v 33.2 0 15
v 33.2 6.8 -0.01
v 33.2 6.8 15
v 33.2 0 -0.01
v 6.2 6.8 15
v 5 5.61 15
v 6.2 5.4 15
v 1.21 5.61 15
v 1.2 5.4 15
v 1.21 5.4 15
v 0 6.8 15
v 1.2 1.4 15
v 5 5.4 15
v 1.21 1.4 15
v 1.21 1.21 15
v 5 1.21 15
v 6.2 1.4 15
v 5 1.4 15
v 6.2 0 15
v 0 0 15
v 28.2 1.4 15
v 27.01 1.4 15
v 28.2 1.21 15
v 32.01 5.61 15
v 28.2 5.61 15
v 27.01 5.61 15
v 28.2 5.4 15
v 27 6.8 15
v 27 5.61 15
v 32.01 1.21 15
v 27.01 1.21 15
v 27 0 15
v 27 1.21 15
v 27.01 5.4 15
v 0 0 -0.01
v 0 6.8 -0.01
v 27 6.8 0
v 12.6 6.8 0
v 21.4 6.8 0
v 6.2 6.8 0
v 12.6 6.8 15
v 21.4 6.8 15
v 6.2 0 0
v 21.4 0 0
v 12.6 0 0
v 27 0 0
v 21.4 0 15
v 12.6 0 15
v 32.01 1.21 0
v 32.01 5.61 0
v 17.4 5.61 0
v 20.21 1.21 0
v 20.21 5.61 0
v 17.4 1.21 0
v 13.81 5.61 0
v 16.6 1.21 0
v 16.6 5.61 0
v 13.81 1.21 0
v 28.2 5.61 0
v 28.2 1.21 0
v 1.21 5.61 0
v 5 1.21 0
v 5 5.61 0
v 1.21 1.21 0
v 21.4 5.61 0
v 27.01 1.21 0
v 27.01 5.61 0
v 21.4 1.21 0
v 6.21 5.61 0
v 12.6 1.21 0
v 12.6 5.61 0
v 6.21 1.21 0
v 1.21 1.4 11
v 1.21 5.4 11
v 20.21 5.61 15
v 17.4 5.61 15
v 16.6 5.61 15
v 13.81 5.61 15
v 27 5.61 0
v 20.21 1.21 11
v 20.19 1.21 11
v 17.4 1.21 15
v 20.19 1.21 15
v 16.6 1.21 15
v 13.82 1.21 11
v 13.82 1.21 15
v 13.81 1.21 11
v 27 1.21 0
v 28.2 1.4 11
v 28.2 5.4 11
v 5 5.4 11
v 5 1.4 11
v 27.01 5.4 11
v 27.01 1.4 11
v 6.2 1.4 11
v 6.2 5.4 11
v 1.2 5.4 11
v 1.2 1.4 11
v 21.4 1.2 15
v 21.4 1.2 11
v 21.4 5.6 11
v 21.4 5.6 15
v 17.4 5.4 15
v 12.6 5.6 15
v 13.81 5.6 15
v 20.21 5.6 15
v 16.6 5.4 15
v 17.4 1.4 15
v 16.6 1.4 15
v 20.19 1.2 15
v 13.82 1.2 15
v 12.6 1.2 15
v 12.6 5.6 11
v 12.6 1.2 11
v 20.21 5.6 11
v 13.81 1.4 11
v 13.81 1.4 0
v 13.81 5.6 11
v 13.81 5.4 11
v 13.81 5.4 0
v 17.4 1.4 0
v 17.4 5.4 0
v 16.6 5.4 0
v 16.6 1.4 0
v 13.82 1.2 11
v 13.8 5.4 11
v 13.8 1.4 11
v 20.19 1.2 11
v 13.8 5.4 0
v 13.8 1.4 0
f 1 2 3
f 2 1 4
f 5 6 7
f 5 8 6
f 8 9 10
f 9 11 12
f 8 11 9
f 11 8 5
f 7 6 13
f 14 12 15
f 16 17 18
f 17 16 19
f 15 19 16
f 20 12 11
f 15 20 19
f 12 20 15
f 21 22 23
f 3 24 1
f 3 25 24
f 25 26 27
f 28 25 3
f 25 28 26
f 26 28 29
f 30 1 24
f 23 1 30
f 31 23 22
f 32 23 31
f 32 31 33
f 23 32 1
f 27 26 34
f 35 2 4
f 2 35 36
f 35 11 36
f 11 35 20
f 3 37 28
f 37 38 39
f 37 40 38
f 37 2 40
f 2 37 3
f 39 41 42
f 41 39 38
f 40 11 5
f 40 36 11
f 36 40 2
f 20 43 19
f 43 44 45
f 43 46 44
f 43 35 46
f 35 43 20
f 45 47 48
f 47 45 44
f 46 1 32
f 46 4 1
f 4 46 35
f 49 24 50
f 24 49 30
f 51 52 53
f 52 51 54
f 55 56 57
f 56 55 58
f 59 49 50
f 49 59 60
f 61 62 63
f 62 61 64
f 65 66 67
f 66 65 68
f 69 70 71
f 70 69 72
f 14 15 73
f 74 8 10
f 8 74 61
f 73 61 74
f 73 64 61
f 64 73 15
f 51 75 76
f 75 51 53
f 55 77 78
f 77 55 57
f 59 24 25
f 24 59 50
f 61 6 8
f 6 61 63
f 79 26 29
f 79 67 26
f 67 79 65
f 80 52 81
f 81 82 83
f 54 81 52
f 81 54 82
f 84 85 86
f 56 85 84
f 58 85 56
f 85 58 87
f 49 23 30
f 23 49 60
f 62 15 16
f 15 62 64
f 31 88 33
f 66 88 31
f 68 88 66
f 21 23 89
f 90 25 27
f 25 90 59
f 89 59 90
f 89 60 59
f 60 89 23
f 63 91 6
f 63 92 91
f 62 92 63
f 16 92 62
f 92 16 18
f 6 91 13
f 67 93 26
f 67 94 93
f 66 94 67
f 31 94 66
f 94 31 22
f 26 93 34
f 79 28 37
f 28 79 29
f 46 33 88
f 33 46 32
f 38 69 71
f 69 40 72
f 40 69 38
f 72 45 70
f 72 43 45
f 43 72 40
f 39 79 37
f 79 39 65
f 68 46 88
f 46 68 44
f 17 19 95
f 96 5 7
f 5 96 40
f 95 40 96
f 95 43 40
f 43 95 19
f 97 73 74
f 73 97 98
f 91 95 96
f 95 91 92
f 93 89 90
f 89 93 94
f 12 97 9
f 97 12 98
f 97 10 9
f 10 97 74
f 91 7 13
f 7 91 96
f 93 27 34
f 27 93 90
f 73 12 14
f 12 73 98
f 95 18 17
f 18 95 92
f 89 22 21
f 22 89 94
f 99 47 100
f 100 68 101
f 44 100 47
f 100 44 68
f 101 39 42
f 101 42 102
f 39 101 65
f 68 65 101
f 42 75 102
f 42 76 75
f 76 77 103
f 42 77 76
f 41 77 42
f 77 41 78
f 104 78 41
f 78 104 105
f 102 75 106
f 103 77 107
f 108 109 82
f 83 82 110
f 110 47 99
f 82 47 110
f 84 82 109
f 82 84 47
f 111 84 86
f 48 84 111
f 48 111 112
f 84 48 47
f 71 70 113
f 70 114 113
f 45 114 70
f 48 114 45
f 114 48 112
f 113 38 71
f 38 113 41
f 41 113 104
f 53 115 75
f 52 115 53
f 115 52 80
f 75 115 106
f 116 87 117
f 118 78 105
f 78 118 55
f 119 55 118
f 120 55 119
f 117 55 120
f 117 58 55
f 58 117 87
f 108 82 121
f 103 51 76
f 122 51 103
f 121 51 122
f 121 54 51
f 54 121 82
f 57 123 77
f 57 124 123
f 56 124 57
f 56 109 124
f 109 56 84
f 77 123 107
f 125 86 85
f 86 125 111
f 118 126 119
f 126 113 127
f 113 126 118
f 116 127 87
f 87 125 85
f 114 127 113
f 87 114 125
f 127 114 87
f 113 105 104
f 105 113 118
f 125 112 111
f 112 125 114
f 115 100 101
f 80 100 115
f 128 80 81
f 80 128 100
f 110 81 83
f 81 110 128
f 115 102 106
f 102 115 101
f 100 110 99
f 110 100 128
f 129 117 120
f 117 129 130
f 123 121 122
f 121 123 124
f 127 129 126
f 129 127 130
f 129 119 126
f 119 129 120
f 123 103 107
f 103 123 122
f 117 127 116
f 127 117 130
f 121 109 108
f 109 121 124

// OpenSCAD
// file: ../Base/PlacementOptions.scad
// Fischertechnik Box Foundation
// Placement Options

// Alignment
NoAlign = 0;
AlignLeft = 1;
AlignBottom = 2;
AlignCenter = 3;
AlignRight = 4;
AlignTop = 5;

// Element rotation degree steps
rotations = [0, -90, -180, -270];

// Rotation
NoRotation = 0;
Rotate0 = 0;
Rotate90 = 1;
Rotate180 = 2;
Rotate270 = 3;

// Docking (seen from above)
NoDock = -1;
DockLeft = 0;
DockTop = 1;
DockRight = 2;
DockCorner = 2;
DockBottom = 3;

// Web corners
LowerLeft = 0;
UpperLeft = 1;
UpperRight = 2;
LowerRight = 3;

// Web position relative to corner
LeftOfCorner = 0;
RightOfCorner = 1;
// file: ../Base/Boxes.scad
// Fischertechnik Box Foundation
// Pre-designed Boxes

use <Constants.scad>

include <PlacementOptions.scad>

box190Width = 190;
box190Depth = 130;
box130Width = 130;
box130Depth = 95;

// Values are from an original ec3 box
topBottomDifference = 1.5;
outerHeight = 40;
baseThickness = 1.8;
innerHeight = outerHeight - baseThickness;
stackExcess = 5.7;
radius = 3.5;
wallThickness = 1.5;
tolerance = 0.2;

boxWallThickness = wallThickness;
boxBaseThickness = baseThickness;
boxWebWidth = 3.0;

// getBoxWallThickness()
// Gets the wall thickness of a Fischertechnik Box
function getBoxWallThickness() = boxWallThickness;

// getBoxUsageHeight(height = 38.2)
// Gets the usable height of a Fischertechnik box
// height = Outer height of the box from the bottom to the upper edge.
function getBoxUsageHeight(height = outerHeight) = height - baseThickness - stackExcess;

// getBoxInnerHeight()
// Gets the inner height of a Fischertechnik box, including the stack excess
function getBoxInnerHeight() = innerHeight;

// getBoxBaseThickness()
// Gets the thickness of the Fischertechnik box base.
function getBoxBaseThickness() = boxBaseThickness;

// getBoxWebWidth()
// Gets the width of a box web
function getBoxWebWidth() = boxWebWidth;

// getBox190Space()
// Gets the usable inner space of a Box 190 as an x/y-list
function getBox190Space() = [
    box190Width - 2*getBoxWallThickness() - topBottomDifference, 
    box190Depth - 2*getBoxWallThickness() - topBottomDifference ];

// RoundedCornerPlate(width, depth, height, radius)
// Creates a body plate with rounded corners for a box. Used
// also to create the complete box with the hull module.
// width = Width of the plate
// depth = depth of the plate 
// height = thickness of the plate
// radius = radius of the rounded corner
module RoundedCornerPlate(width, depth, height, radius) {
    translate([radius, radius])
    hull() {
        w = width-2*radius;
        d = depth-2*radius;
        cube([w, d, height]);
        cylinder(height, r=radius, $fn=getFragments());
        translate([w, 0])
            cylinder(height, r=radius, $fn=getFragments());
        translate([w, d])
            cylinder(height, r=radius, $fn=getFragments());
        translate([0, d])
            cylinder(height, r=radius, $fn=getFragments());
    }
}

// BoxBase(width, depth)
// Creates an empty stackable Fischertechnik compatible box
// width = Outer width of the box (190, 130, ...)
// depth = Outer depth of the box (130, 95, ...)

module BoxBase(width, depth, height=outerHeight) {    
    thinPlate = 0.01;

    innerHeight = height - baseThickness;    
    
    module Body(tolerance=tolerance) {
        hull() {
            // Bottom with tolerance to fit into the original boxes when stacked
            translate([-wallThickness+tolerance, -wallThickness+tolerance, -baseThickness])
                RoundedCornerPlate(width-topBottomDifference-2*tolerance, depth-topBottomDifference-2*tolerance, thinPlate, radius);
            
            // Top
            translate([-wallThickness-topBottomDifference/2, -wallThickness-topBottomDifference/2, innerHeight-thinPlate])
                RoundedCornerPlate(width, depth, thinPlate, radius);
         }
    }

    module Cutoff() {
        hull() {
            coWidth = width - 2*wallThickness;
            coDepth = depth - 2*wallThickness;
            
            // Bottom
            RoundedCornerPlate(coWidth-topBottomDifference, coDepth-topBottomDifference, thinPlate, radius);

            // Top
            translate([-topBottomDifference/2, -topBottomDifference/2, innerHeight+thinPlate]) 
                RoundedCornerPlate(coWidth, coDepth, thinPlate, radius);
        }
    }
    
    difference() {        
        Body();
        Cutoff();
        stackOffset = innerHeight - stackExcess;
        translate([0, 0, stackOffset + baseThickness])
            Body(tolerance=0);
    }
}

// Creates the Fischertechnik empty box 130x190 mm and places it at position 0,0
// 190x130 are the outer sizes, the inner space is slightly smaller. Use getBox190Space() to get the inner sizes.
// The box is positioned that the usable inner space is at the 0,0,0 position.

module Box190() {
    BoxBase(box190Width, box190Depth);
}

// Gets the usable inner space of a Box 130 as an x/y-list
function getBox130Space() = [
    box130Width - 2*getBoxWallThickness() - topBottomDifference, 
    box130Depth - 2*getBoxWallThickness() - topBottomDifference ];

// Creates the Fischertechnik empty box 95x130 mm and places it at position 0,0
// 190x130 are the outer sizes, the inner space is slightly smaller. Use getBox190Space() to get the inner sizes.
// The box is positioned that the usable inner space is at the 0,0,0 position.

module Box130() {
    BoxBase(box130Width, box130Depth);
}

// Creates a web at the specified box walls
// corner 0 = LowerLeft, 1 = UpperLeft, 2 = UpperRight, 3 = LowerRight
// side 0 = LeftOfCorner, 1 = RightOfCorner
// distance = Distance in mm from the corner
// boxSpace = inner width and depth of the box (default: Box 190)
// webWidth = length of the web (default is 3 mms)
// webThickness = thickness of the web (default is 1 mm)
// height = Height of the web (standard is getBoxUsageHeight())

module BoxWeb(corner, side, distance, boxSpace=getBox190Space(), webWidth=getBoxWebWidth(), webThickness=1.0, height=getBoxUsageHeight()) {
    sink = getBoxWallThickness()/2;

    width = (corner % 2 == 0) ? 
            (side == LeftOfCorner ? webWidth : webThickness) :
            (side == LeftOfCorner ? webThickness : webWidth);

    depth = (corner % 2 == 0) ? 
            (side == RightOfCorner ? webWidth : webThickness) :
            (side == RightOfCorner ? webThickness : webWidth);
    
    xDiff = corner == LowerLeft ? 
                (side == LeftOfCorner ? -sink : distance) :
            (corner == UpperLeft ?                
                (side == LeftOfCorner ? distance : -sink) :
            (corner == UpperRight ?
                (side == LeftOfCorner ? boxSpace.x-webWidth+sink : boxSpace.x-distance-webThickness) :
                (side == LeftOfCorner ? boxSpace.x-distance-webThickness: boxSpace.x-webWidth+sink)));

    yDiff = corner == LowerLeft ? 
                (side == RightOfCorner ? -sink : distance) :
            (corner == UpperLeft ?
                (side == RightOfCorner ? boxSpace.y-distance-webThickness : boxSpace.y-webWidth+sink) :
            (corner == UpperRight ?
                (side == RightOfCorner ? boxSpace.y-webWidth+sink : boxSpace.y-distance-webThickness) :
                (side == RightOfCorner ? distance : -sink)));
    
    translate([xDiff, yDiff, -getExcess()])
        cube([width, depth, height + 2*getExcess()]);
}
// file: ../Base/Rotation.scad
// Fischertechnik Box Foundation
// Geometry Helpers Rotation

include <PlacementOptions.scad>

// getRotatedSpace(space, rotation=NoRotation)
// Rotates the space dependent on the specified rotation

function getRotatedSpace(space, rotation=NoRotation) = [
    (rotation == Rotate90 || rotation == Rotate270) ? space.y : space.x,
    (rotation == Rotate90 || rotation == Rotate270) ? space.x : space.y
];

// Rotates the given space around the fixed left lower corner
// space = the space the children needs as width/depth list [width,depth]
// rotation = 0 Rotate0 degrees, 1 Rotate90 degrees, 2 Rotate180 degrees, 3 Rotate270 degrees (equivalent to -90)

module RotateFix(space, rotation=NoRotation) {
    dy = (rotation == Rotate0 || rotation == Rotate270) ? 0 :
        (rotation == Rotate90) ? space.x :
        space.y;
    dx = (rotation < Rotate180) ? 0 :
        (rotation == Rotate180) ? space.x :
        space.y;
    
    translate([dx, dy, 0])
        rotate([0, 0, rotations[rotation]])
            children();
}
// file: ../Base/Alignment.scad
// Fischertechnik Box Foundation
// Geometry Helpers Alignment

include <PlacementOptions.scad>

// getAlignedX(elementWidth, spaceWidth, align=AlignRight, offset=0)
// Gets the aligned X offset of an element with the given
// width in the given space.
// elementWidth = The width of the element to positon
// spaceWidth = The space where the element should be aligned
// align = 0 AlignLeft, 1 AlignCenter, 2 AlignRight
// offset = an optional offset from the aligned position. When
// aligned left or centered, then positive values are in X direction.
// When aligned right then positive values are in negative X direction.

function getAlignedX(elementWidth, spaceWidth, align=AlignRight, offset=0) =
    (align == AlignLeft) ?
        offset :
        ((align == AlignCenter) ?
        (spaceWidth - elementWidth)/2 + offset :
        spaceWidth - offset - elementWidth);

// getAlignedY(elementDepth, spaceDepth, align=AlignTop, offset=0)
// Gets the aligned Y offset of an element with the given
// depth in the given space.
// elementDepth = The depth of the element to positon
// spaceDepth = The space where the element should be aligned
// align = 0 AlignBottom, 1 AlignCenter, 2 AlignTop
// offset = an optional offset from the aligned position. When
// aligned bottom or centered, then positive values are in Y direction.
// When aligned top then positive values are in negative Y direction.

function getAlignedY(elementDepth, spaceDepth, align=AlignTop, offset=0) =
    (align == AlignBottom) ?
        offset :
        ((align == AlignCenter) ?
        (spaceDepth - elementDepth)/2 + offset :
        spaceDepth - offset - elementDepth);
// file: FrameAxis30.scad
// Fischertechnik Box Library
// Frame for single 30 mm Axis
// 31034
// For standing axis see CylinderAxis30

use <../ModelBase/Complex.scad>

length = 30;

// getFrameAxis30Space()
// Gets the width (.x) and depth (.y) of the axis frame.

function getFrameAxis30Space() = getFrameAxisSpace(length);

// FrameAxis30()
// Axis holder for a single 30 mm axis.
// For standing axis see CylinderAxis30

module FrameAxis30() {
    FrameAxis(length);
}

// Test
color("lightgray")
FrameAxis30();
// file: ../Base/Placement.scad
// Fischertechnik Box Foundation
// Geometry Helpers Placement

use <Constants.scad>
use <Alignment.scad>
use <Rotation.scad>
use <Boxes.scad>

include <PlacementOptions.scad>

// Place(x=0, y=0, elementSpace=[0,0], alignX=AlignLeft, alignY=AlignBottom, rotation=Rotate0, boxSpace=getBox190Space())
// Places the child at the specified position
// y = Y-Position. This is a relative position when an X aligment is specified.
// x = X-Position. This is a relative position when an Y aligment is specified.
// elementSpace = space of the element to be placed [x,y]
// alignX = -1=NoAlign, 0 AlignLeft, 1 AlignCenter, 3 AlignRight (elementSpace and boxSpace required!)
// alignY = -1=NoAlign, 2 AlignBottom, 1 AlignCenter, 4 AlignTop (elementSpace and boxSpace required!)
// rotation = 0 Rotate0 0 degrees, 1 Rotate90 90 degrees, 
// 2 Rotate180 180 degrees, 3 Rotate270 270 degrees (equivalent to -90)
// boxSpace = Inner space of the box where the placement occurs [x,y] - default is Box 190x130 inner space

module Place(x=0, y=0, elementSpace=[0,0], 
  alignX=AlignLeft, alignY=AlignBottom, 
  rotation=NoRotation, boxSpace=getBox190Space()) {

    module Position(x, y, space, rotation=Rotate0) {
        translate([x, y, 0])
            RotateFix(space, rotation)
                children();
    }

    space = getRotatedSpace(elementSpace, rotation);
    alignedX = getAlignedX(space.x, boxSpace.x, alignX, x);
    alignedY = getAlignedY(space.y, boxSpace.y, alignY, y);
    Position(alignedX, alignedY, elementSpace, rotation)
        children();
}

// Center(space=getBox130Space(), elementSpace=[0,0])
// space = Space where the children is centered. For cylinder use centered=true and no elementSpace.
// elementSpace = space of the element to be centered [x,y]

module Center(space=getBox190Space(), elementSpace=[0,0]) {
    Place(elementSpace=elementSpace, boxSpace=space, alignX=AlignCenter, alignY=AlignCenter)
        children();
}

// CenterHorizontal(width=0, y=0, offset=0, space=getBox130Space())
// width = Width of the element to be placed.
// y = Y position of the element
// offset = Offset from the center position (negative will be left of the center)
// space = Space where the element is placed

module CenterHorizontal(width=0, y=0, offset=0, space=getBox190Space()) {
    Place(x=offset, y=y, elementSpace=[width, 0], boxSpace=space, alignX=AlignCenter)
        children(0);
}

// CenterVertical(depth=0, x=0, offset=0, space=getBox130Space())
// depth = Depth of the element to be placed.
// x = X position of the element
// offset = Offset from the center position (negative will be down of the center)
// space = Space where the element is placed

module CenterVertical(depth=0, x=0, offset=0, space=getBox190Space()) {
    Place(x=x, y=offset, elementSpace=[0, depth], boxSpace=space, alignY=AlignCenter)
        children(0);
}

// getIsVertical(align)
// True if the specified alignment needs a vertical orientation for a divider (AlignRight, AlignLeft)

function getIsVertical(align) = (align == AlignRight || align == AlignLeft);

// getIsHorizontal(align)
// True if the specified alignment needs a horizontal orientation for a divider (AlignTop, AlignBottom)

function getIsHorizontal(align) = (align == AlignTop || align == AlignBottom);
// file: ../Base/Constants.scad
// Fischertechnik Box Foundation
// Constants

// Constant values necessary for multiple elements

// Base constants
dividerThickness = 1.2;
excess = 0.01;
fragments = 90;
tolerance = 0.8;

// Gets the thickness of a divider 
function getDividerThickness() = dividerThickness;

// Gets the excess that is used to merge walls into each other
function getExcess() = excess;

// Gets amount of fragments of a cylinder
function getFragments() = fragments;

// Gets the inner tolerance of a frame to each side
function getTolerance() = tolerance;


// Fischertechnik specific constants
axisDiameter = 4;
axisBottomDiameter = axisDiameter + 1;
axisTolerance = 0.2;

// Gets axis diameter of Fischertechnik axis
function getAxisDiameter() = axisDiameter;

// Gets axis diameter tolerance (subtracted for element axis)
function getAxisTolerance() = axisTolerance;

// Gets the axis diameter for standing axis
function getStandAxisDiameter() = getAxisDiameter() - getAxisTolerance();

// Gets axis bottom diameter for thicker part at the bottom
function getAxisBottomDiameter() = axisBottomDiameter;

standardEdgeDistance = 2.5;
standardWebDistance = 11.5;
standardCornerLength = 15;

// gets the standard distance to the wall of the box for dockable frames with webs
function getStandardEdgeDistance() = standardEdgeDistance;

// gets the standard distance of each web to the corner of the dockable frame
function getStandardWebDistance() = standardWebDistance;

// gets the standard length of the corner walls of a dockable frame
function getStandardCornerLength() = standardCornerLength;

tubeWallFactor = 0.8;

// gets the wall thickness of a tube.
function getTubeWallThickness() = tubeWallFactor * getDividerThickness();

smallPartsFrameHeight = 20;

// gets the frame height for docked small parts boxes.
function getSmallPartsFrameHeight() = smallPartsFrameHeight;

hubRingDiameter = 19.5;
hubRingLevelDiameter = 21;

// gets the diameter of a tube matching the inner ring of a wheel
function getHubRingDiameter() = hubRingDiameter;

// gets the diameter of a hub tube with a thicker diameter
function getHubRingLevelDiameter() = hubRingLevelDiameter;
// main file
// Fischertechnik Box Library
// Frame for single 30 mm connecting rod
// 37276

use <../Base/Constants.scad>
use <../Base/Placement.scad>
use <../ModelBase/Complex.scad>
use <FrameAxis30.scad>

/* [Hidden] */
length = 30;
bearingLength = 5;

// getFrameConnectingRod30Space()
// Gets the width (.x) and depth (.y) of the axis frame.

function getFrameConnectingRod30Space() = getFrameAxis30Space();

// FrameConnectingRod30()
// Axis holder for a single 30 mm connecting rod.

module FrameConnectingRod30() {
    ElevatedFramesWithCutoff([length, getAxisDiameter(), getAxisDiameter()], getFrameAxisDepth(), getFrameAxisHeight(), bearingLength);
    CenterHorizontal(getAxisMiddleSupportSpace().x, space = getFrameAxis30Space())
        AxisMiddleSupport();
}

// Test
color("lightgray")
FrameConnectingRod30();
